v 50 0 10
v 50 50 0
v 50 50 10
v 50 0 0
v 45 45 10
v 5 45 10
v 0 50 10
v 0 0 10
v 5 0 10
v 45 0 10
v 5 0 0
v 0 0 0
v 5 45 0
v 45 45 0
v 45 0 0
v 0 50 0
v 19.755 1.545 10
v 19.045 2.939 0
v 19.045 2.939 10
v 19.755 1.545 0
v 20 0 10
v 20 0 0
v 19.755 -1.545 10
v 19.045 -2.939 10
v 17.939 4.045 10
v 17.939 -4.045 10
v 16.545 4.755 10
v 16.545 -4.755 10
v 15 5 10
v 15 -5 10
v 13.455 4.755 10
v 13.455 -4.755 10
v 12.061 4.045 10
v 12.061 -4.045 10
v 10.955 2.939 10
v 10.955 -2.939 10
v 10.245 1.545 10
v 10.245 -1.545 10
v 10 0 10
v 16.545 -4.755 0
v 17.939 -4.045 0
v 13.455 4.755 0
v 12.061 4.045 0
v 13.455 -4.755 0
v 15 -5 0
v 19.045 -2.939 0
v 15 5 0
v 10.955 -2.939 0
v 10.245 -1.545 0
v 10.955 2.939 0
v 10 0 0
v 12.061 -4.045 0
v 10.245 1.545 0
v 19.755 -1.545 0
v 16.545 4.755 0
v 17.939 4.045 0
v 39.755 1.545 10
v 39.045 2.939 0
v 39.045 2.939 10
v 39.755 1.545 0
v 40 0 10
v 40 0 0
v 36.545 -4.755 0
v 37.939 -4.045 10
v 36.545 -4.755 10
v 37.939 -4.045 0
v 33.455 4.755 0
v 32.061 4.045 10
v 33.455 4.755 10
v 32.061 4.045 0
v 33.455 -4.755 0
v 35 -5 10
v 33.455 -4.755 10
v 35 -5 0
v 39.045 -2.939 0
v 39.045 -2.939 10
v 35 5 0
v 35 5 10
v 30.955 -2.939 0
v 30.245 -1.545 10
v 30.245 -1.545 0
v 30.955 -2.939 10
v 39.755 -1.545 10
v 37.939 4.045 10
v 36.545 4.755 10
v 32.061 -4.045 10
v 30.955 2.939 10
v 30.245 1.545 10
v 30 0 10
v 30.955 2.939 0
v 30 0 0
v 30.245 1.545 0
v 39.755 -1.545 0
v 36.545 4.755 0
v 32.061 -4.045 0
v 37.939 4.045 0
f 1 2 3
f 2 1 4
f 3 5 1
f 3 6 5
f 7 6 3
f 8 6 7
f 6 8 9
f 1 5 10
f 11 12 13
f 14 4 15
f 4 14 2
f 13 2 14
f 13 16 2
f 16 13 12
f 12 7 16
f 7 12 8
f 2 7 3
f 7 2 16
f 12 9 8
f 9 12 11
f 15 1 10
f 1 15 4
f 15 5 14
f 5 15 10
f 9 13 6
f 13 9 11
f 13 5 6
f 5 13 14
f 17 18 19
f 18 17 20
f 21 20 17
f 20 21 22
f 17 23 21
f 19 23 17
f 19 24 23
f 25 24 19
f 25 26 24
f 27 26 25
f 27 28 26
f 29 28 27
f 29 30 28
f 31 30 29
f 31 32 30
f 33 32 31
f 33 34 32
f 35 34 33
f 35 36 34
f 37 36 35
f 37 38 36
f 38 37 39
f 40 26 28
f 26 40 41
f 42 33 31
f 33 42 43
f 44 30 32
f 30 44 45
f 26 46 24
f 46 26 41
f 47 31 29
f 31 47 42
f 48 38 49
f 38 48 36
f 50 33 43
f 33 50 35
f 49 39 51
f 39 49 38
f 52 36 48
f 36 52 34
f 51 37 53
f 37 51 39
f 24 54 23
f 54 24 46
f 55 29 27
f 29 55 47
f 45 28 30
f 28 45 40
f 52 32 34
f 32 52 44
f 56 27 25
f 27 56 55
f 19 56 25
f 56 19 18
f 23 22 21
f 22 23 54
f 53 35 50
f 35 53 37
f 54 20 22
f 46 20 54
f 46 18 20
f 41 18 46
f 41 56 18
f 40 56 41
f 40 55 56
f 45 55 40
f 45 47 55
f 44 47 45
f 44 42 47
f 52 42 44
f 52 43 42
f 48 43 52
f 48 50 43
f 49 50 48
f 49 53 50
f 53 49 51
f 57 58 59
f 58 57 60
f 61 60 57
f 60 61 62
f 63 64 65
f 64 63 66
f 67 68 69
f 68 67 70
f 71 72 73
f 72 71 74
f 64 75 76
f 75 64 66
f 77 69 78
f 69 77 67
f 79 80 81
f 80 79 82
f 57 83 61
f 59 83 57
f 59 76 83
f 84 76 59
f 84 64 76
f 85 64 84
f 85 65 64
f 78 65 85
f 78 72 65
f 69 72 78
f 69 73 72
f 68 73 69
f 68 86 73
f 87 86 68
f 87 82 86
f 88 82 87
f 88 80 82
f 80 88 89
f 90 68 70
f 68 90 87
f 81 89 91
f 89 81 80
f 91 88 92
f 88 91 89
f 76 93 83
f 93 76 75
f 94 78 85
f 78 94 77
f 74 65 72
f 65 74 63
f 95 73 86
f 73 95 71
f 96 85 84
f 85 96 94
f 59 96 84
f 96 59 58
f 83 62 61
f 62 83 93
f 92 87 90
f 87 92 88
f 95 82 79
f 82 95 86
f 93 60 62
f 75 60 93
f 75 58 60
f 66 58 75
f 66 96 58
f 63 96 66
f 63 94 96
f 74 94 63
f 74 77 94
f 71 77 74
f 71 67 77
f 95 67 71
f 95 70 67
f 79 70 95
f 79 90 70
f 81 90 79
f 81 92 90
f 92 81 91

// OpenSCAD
union() {
    difference() {
        cube([50,50,10]);
        translate([5,0,0]) {
            cube([40,45,10]);
        }
    }
    translate([15,0,0])
        cylinder(r=5,h=10,$fn=20);
    translate([35,0,0])
        cylinder(r=5,h=10,$fn=20);
}
